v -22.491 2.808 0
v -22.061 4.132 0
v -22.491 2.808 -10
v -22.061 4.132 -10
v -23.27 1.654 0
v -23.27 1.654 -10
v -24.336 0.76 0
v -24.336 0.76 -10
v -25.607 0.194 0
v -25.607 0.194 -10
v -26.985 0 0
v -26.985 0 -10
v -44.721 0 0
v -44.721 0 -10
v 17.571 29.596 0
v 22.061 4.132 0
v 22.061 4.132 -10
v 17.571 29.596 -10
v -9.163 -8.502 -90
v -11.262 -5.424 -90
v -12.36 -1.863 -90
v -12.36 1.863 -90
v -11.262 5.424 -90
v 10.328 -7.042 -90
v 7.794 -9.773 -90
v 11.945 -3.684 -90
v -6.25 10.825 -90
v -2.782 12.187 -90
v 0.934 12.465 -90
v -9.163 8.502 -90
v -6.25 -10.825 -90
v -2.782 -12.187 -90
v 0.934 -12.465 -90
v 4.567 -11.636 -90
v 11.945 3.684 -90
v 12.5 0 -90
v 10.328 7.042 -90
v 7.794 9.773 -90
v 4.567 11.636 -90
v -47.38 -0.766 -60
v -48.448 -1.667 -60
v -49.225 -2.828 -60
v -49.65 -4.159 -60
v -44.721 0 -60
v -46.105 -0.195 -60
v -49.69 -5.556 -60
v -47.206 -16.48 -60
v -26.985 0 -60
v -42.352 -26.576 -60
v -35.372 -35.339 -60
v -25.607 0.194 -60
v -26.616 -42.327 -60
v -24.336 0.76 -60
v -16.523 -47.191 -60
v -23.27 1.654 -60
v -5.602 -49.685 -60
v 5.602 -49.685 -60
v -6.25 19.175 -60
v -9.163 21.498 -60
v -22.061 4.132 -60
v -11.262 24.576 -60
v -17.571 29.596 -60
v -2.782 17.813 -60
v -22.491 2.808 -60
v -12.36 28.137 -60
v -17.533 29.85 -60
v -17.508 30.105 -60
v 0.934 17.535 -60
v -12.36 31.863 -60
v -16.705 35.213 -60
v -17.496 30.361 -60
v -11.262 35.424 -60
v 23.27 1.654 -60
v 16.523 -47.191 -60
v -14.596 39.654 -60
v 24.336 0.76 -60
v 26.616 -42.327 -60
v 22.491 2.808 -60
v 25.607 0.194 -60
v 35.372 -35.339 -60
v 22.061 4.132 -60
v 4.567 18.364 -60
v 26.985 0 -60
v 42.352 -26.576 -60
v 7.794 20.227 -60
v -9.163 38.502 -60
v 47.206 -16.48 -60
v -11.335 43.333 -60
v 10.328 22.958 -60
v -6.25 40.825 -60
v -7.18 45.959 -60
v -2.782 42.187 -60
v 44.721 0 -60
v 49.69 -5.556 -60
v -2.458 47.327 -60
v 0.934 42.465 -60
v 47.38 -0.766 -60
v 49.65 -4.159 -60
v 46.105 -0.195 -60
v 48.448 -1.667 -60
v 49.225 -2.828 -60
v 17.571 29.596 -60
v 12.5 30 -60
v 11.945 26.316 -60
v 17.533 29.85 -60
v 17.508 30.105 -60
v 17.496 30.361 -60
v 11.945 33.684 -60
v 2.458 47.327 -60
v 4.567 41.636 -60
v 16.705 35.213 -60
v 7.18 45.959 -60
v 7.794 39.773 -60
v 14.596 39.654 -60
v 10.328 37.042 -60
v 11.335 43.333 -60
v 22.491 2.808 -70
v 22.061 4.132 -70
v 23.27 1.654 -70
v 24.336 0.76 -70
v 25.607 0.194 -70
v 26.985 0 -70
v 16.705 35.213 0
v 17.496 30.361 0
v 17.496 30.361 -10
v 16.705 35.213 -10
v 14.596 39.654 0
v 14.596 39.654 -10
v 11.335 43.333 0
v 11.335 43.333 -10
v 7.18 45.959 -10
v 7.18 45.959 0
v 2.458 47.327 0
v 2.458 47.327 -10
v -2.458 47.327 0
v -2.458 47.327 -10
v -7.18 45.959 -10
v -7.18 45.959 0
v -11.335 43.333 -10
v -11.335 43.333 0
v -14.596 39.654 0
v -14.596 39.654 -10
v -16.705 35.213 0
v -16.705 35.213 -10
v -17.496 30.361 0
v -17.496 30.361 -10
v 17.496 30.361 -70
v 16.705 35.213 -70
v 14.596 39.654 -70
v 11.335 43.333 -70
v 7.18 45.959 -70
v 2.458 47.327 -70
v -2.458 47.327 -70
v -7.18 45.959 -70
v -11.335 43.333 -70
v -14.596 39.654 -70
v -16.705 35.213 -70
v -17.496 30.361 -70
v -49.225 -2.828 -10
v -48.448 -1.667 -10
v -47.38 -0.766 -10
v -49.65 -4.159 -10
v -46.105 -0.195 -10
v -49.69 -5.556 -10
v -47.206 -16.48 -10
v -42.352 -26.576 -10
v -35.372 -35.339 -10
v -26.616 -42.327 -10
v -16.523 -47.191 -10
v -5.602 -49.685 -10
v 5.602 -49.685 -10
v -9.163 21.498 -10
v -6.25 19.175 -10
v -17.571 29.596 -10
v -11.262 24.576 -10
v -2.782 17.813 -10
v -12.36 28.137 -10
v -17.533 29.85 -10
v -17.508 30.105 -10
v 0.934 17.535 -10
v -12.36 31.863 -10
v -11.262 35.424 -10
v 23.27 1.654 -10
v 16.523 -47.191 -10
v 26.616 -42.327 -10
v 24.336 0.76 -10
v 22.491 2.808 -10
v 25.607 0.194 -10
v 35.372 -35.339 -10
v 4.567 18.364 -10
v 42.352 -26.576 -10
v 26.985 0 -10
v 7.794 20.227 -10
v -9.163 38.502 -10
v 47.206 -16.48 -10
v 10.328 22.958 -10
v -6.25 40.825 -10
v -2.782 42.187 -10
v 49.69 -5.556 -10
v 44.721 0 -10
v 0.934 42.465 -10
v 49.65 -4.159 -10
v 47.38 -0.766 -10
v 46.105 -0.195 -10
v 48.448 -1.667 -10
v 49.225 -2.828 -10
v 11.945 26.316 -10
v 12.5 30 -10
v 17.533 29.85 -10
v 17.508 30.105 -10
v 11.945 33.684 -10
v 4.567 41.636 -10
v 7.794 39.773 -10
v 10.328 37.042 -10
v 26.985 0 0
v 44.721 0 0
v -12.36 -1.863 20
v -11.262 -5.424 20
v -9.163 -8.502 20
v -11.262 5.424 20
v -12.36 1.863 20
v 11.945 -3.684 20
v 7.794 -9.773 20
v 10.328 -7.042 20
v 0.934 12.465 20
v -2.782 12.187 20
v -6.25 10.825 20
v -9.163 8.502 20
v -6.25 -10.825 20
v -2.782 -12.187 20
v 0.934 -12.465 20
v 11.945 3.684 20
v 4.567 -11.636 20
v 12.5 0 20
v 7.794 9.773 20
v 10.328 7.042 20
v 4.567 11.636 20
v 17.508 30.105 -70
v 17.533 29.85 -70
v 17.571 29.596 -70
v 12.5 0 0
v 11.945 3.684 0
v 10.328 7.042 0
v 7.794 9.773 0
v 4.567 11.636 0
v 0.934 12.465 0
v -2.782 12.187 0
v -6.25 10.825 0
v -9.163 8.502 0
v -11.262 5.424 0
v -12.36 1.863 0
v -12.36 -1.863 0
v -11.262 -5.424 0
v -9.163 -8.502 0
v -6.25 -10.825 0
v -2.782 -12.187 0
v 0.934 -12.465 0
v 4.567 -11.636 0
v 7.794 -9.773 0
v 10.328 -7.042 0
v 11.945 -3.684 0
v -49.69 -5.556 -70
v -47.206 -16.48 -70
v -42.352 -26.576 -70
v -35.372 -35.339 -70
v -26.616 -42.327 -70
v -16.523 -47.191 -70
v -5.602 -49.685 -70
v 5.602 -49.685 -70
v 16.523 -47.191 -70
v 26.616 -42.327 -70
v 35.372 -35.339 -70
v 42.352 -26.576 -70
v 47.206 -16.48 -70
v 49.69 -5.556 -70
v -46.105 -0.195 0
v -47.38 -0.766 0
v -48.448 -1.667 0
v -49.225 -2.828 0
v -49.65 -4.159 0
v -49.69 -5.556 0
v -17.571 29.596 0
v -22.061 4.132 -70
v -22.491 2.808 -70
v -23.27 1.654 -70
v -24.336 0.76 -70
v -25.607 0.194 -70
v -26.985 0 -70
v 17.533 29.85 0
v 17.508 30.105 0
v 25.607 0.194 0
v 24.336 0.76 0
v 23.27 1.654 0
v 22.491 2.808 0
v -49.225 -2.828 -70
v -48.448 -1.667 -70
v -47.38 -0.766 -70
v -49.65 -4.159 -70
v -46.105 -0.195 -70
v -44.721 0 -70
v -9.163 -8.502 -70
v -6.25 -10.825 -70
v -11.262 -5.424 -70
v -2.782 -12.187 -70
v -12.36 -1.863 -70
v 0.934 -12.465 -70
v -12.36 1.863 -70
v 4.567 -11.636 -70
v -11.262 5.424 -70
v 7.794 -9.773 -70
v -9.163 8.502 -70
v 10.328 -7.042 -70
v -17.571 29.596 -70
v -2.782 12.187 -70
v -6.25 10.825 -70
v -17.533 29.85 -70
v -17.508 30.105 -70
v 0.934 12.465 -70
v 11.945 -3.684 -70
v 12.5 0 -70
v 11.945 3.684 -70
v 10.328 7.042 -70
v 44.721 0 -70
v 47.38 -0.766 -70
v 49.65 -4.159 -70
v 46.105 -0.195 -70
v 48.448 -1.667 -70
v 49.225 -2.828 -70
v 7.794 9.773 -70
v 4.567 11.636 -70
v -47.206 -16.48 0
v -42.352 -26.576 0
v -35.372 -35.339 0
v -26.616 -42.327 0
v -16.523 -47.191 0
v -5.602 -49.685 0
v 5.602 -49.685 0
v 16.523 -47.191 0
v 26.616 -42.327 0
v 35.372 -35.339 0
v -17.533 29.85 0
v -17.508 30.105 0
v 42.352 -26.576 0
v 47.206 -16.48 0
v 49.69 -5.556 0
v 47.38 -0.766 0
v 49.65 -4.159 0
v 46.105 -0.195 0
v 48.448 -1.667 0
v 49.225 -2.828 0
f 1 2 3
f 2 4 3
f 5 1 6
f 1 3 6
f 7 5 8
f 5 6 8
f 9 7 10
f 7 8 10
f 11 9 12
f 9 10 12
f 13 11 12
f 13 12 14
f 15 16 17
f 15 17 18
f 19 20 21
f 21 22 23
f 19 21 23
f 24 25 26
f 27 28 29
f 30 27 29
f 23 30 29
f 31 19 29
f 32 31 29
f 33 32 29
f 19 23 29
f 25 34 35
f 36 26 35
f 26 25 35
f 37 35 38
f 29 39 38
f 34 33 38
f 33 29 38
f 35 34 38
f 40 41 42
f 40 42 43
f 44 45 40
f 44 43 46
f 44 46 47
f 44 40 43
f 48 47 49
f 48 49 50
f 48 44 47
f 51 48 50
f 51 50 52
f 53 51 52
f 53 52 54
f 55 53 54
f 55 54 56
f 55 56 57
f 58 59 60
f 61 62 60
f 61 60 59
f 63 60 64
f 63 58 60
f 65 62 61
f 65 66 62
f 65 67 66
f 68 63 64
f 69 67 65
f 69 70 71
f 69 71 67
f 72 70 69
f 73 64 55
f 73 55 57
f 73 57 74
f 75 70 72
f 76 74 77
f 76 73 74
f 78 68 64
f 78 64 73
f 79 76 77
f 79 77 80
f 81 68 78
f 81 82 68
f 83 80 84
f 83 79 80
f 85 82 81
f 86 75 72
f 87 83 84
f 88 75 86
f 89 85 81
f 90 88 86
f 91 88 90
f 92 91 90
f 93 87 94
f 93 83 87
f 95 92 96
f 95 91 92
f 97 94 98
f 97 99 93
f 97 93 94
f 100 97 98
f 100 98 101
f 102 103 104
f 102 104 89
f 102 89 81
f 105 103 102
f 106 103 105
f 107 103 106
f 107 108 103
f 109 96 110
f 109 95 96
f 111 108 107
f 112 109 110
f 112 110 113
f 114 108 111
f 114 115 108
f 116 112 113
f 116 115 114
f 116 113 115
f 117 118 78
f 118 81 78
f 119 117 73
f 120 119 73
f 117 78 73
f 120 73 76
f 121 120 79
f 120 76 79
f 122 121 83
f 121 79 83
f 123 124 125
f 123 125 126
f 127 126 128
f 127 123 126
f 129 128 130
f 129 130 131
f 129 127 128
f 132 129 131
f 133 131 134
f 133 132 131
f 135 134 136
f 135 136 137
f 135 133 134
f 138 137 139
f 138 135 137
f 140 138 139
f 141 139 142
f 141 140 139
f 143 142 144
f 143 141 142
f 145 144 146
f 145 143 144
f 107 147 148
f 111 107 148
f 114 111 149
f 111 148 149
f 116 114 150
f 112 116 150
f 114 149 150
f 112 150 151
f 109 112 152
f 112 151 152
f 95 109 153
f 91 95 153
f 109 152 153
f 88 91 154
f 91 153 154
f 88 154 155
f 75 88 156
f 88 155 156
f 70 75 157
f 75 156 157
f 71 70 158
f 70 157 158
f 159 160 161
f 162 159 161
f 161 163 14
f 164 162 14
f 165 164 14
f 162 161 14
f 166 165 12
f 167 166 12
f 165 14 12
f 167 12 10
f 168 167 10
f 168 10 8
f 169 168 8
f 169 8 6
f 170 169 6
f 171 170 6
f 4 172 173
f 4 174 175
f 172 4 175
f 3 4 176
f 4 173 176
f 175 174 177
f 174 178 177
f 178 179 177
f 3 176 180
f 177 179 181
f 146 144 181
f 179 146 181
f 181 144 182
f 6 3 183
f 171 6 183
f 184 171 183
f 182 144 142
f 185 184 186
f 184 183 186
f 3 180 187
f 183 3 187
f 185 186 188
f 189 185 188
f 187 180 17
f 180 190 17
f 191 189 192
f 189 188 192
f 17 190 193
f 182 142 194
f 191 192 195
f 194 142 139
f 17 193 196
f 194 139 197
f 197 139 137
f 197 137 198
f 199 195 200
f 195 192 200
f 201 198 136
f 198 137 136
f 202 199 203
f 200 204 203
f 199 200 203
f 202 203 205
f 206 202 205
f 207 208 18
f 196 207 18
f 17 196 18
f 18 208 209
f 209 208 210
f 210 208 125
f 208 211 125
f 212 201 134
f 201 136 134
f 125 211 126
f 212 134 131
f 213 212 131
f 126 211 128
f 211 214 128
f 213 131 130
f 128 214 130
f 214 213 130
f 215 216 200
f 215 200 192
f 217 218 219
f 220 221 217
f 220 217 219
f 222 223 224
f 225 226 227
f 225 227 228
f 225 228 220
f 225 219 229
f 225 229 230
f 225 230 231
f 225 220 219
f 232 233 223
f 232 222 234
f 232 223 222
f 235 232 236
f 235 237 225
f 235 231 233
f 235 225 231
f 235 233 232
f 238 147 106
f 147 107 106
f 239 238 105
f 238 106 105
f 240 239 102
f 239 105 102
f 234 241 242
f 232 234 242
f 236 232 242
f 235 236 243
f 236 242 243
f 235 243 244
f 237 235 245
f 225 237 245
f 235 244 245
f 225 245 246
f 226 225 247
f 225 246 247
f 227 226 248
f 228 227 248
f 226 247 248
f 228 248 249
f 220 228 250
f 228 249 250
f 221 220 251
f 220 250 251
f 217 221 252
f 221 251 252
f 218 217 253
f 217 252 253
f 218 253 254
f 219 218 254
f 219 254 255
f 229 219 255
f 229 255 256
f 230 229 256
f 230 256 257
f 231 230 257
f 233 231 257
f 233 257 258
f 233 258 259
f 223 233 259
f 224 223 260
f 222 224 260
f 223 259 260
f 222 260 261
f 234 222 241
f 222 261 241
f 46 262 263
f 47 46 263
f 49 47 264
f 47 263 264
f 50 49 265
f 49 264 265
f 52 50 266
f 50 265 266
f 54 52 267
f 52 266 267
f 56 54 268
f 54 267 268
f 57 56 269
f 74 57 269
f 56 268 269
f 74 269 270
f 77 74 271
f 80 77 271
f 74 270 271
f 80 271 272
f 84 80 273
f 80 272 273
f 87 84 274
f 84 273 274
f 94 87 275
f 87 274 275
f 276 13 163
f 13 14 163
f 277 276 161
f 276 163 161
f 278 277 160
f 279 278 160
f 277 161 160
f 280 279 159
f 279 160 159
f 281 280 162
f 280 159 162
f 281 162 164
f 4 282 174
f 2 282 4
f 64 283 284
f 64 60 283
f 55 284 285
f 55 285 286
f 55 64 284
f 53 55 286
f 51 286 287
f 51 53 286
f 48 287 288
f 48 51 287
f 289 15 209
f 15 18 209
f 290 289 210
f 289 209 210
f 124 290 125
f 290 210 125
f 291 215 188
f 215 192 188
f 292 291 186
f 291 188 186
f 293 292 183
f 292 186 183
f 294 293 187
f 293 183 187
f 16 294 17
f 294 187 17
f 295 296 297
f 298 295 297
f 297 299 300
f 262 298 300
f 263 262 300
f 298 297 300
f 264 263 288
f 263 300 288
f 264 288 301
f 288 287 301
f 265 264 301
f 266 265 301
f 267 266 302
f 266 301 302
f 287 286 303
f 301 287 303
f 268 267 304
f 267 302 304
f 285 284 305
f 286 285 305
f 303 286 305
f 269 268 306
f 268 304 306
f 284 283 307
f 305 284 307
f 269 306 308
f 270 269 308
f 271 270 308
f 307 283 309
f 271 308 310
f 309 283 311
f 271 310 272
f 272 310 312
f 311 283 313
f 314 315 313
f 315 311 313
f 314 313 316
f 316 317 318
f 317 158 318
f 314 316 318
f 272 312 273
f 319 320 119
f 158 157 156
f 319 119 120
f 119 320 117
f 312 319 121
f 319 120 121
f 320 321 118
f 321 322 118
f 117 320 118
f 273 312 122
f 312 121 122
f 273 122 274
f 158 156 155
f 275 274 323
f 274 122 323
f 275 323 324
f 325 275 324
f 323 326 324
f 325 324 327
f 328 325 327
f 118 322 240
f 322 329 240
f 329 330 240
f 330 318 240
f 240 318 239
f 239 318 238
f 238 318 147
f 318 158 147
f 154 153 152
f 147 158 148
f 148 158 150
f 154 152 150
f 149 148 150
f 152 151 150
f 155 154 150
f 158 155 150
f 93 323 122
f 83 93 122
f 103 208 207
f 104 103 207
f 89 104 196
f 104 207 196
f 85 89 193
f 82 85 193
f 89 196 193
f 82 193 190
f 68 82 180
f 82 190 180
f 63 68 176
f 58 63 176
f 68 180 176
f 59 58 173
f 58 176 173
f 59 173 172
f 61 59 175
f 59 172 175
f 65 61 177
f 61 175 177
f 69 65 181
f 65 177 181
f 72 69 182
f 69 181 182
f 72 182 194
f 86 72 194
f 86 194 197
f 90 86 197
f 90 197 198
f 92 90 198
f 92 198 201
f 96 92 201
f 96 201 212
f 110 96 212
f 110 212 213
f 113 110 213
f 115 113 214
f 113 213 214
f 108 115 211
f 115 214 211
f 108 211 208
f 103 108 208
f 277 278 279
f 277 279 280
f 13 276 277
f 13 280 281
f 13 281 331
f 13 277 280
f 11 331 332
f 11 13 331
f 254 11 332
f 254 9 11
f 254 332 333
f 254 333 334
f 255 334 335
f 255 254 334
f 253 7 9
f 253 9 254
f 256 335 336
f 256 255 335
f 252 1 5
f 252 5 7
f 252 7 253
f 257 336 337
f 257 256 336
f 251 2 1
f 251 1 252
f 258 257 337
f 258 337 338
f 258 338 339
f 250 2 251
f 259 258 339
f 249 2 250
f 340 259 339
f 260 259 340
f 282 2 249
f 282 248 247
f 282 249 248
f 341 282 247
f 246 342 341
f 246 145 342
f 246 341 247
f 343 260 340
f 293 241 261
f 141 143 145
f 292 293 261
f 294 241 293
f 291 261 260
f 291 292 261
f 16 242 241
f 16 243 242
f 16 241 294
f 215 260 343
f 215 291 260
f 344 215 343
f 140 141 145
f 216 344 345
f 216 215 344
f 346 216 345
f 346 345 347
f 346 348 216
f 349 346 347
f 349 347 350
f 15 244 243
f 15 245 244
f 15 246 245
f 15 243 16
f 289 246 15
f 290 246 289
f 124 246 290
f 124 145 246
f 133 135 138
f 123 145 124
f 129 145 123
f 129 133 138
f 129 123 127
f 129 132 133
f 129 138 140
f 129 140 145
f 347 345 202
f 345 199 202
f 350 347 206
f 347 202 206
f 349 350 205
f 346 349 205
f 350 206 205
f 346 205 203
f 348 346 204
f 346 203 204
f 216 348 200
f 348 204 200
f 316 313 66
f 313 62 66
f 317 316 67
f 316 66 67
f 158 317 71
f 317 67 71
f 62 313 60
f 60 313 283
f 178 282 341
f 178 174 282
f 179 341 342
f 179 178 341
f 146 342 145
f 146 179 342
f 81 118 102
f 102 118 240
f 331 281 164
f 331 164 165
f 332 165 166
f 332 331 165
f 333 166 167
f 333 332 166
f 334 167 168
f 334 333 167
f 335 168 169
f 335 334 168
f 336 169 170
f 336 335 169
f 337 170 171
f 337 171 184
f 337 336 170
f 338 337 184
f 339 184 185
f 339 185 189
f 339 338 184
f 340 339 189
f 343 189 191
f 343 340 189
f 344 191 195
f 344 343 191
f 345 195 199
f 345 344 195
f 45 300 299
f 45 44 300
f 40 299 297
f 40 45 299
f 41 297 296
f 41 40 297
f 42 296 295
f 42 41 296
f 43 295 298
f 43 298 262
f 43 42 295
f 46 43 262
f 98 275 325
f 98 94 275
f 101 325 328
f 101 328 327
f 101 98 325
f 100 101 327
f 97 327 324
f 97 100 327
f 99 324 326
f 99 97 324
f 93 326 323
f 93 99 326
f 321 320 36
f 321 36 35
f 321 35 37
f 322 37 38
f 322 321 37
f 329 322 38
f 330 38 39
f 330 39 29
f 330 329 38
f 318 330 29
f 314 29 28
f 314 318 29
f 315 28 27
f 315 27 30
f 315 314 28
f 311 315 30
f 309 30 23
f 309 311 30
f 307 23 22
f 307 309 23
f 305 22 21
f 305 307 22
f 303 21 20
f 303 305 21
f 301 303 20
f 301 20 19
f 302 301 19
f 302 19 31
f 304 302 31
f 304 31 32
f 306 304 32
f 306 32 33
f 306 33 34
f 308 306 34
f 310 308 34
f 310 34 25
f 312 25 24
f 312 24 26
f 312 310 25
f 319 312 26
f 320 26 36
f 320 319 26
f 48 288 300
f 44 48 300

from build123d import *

# Parameters (mm, degrees)
BOSS_EXTRUDE1_DEPTH  = 10
FILLET1_R            = 5
SKETCH2_R            = 12.5
BOSS_EXTRUDE2_DEPTH  = 20
SKETCH3_R            = 12.5
BOSS_EXTRUDE3_DEPTH  = 50
FILLET1_OF_MIRROR1_R = 5


with BuildPart() as part:
    # Sketch1 → Boss-Extrude1 (new body)
    with BuildSketch(Plane.XY):
        with BuildLine():
            Line((-17.5, 30), (-22.789809421, 0))
            Line((-22.789809421, 0), (-50, 0))
            ThreePointArc((-50, 0), (0, -50), (50, 0))
            Line((50, 0), (22.789809421, 0))
            Line((22.789809421, 0), (17.5, 30))
            ThreePointArc((17.5, 30), (0, 47.5), (-17.5, 30))
        make_face()
    boss_extrude1 = extrude(amount=-BOSS_EXTRUDE1_DEPTH)

    # Fillet1
    fillet1_edges = [part.edges().sort_by_distance(p)[0] for p in [
        (-50, 0, -5),
        (-22.789809421, 0, -5),
        (-17.5, 30, -5),
        (17.5, 30, -5),
        (22.789809421, 0, -5),
        (50, 0, -5),
    ]]
    fillet(fillet1_edges, radius=FILLET1_R)

    # Sketch2 → Boss-Extrude2 (add)
    with BuildSketch(Plane.XY):
        Circle(SKETCH2_R)
    boss_extrude2 = extrude(amount=BOSS_EXTRUDE2_DEPTH)

    # Sketch3 → Boss-Extrude3 (add)
    with BuildSketch(Plane(origin=(0, 0, -10), x_dir=(-1, 0, 0), z_dir=(0, 0, -1))):
        with Locations(Location((0, 30, 0), (0, 0, 180))):
            Circle(SKETCH3_R)
    extrude(amount=BOSS_EXTRUDE3_DEPTH)

    # Mirror1: Boss-Extrude1, Boss-Extrude2 across plane
    add(boss_extrude1.mirror(Plane(origin=(0, 0, -35), x_dir=(1, 0, 0), z_dir=(0, 0, -1))))
    add(boss_extrude2.mirror(Plane(origin=(0, 0, -35), x_dir=(1, 0, 0), z_dir=(0, 0, -1))))

    # Fillet1 of Mirror1
    fillet1_of_mirror1_edges = [part.edges().sort_by_distance(p)[0] for p in [
        (-50, 0, -65),
        (-22.789809421, 0, -65),
        (-17.5, 30, -65),
        (17.5, 30, -65),
        (22.789809421, 0, -65),
        (50, 0, -65),
    ]]
    fillet(fillet1_of_mirror1_edges, radius=FILLET1_OF_MIRROR1_R)


solid = part.part
